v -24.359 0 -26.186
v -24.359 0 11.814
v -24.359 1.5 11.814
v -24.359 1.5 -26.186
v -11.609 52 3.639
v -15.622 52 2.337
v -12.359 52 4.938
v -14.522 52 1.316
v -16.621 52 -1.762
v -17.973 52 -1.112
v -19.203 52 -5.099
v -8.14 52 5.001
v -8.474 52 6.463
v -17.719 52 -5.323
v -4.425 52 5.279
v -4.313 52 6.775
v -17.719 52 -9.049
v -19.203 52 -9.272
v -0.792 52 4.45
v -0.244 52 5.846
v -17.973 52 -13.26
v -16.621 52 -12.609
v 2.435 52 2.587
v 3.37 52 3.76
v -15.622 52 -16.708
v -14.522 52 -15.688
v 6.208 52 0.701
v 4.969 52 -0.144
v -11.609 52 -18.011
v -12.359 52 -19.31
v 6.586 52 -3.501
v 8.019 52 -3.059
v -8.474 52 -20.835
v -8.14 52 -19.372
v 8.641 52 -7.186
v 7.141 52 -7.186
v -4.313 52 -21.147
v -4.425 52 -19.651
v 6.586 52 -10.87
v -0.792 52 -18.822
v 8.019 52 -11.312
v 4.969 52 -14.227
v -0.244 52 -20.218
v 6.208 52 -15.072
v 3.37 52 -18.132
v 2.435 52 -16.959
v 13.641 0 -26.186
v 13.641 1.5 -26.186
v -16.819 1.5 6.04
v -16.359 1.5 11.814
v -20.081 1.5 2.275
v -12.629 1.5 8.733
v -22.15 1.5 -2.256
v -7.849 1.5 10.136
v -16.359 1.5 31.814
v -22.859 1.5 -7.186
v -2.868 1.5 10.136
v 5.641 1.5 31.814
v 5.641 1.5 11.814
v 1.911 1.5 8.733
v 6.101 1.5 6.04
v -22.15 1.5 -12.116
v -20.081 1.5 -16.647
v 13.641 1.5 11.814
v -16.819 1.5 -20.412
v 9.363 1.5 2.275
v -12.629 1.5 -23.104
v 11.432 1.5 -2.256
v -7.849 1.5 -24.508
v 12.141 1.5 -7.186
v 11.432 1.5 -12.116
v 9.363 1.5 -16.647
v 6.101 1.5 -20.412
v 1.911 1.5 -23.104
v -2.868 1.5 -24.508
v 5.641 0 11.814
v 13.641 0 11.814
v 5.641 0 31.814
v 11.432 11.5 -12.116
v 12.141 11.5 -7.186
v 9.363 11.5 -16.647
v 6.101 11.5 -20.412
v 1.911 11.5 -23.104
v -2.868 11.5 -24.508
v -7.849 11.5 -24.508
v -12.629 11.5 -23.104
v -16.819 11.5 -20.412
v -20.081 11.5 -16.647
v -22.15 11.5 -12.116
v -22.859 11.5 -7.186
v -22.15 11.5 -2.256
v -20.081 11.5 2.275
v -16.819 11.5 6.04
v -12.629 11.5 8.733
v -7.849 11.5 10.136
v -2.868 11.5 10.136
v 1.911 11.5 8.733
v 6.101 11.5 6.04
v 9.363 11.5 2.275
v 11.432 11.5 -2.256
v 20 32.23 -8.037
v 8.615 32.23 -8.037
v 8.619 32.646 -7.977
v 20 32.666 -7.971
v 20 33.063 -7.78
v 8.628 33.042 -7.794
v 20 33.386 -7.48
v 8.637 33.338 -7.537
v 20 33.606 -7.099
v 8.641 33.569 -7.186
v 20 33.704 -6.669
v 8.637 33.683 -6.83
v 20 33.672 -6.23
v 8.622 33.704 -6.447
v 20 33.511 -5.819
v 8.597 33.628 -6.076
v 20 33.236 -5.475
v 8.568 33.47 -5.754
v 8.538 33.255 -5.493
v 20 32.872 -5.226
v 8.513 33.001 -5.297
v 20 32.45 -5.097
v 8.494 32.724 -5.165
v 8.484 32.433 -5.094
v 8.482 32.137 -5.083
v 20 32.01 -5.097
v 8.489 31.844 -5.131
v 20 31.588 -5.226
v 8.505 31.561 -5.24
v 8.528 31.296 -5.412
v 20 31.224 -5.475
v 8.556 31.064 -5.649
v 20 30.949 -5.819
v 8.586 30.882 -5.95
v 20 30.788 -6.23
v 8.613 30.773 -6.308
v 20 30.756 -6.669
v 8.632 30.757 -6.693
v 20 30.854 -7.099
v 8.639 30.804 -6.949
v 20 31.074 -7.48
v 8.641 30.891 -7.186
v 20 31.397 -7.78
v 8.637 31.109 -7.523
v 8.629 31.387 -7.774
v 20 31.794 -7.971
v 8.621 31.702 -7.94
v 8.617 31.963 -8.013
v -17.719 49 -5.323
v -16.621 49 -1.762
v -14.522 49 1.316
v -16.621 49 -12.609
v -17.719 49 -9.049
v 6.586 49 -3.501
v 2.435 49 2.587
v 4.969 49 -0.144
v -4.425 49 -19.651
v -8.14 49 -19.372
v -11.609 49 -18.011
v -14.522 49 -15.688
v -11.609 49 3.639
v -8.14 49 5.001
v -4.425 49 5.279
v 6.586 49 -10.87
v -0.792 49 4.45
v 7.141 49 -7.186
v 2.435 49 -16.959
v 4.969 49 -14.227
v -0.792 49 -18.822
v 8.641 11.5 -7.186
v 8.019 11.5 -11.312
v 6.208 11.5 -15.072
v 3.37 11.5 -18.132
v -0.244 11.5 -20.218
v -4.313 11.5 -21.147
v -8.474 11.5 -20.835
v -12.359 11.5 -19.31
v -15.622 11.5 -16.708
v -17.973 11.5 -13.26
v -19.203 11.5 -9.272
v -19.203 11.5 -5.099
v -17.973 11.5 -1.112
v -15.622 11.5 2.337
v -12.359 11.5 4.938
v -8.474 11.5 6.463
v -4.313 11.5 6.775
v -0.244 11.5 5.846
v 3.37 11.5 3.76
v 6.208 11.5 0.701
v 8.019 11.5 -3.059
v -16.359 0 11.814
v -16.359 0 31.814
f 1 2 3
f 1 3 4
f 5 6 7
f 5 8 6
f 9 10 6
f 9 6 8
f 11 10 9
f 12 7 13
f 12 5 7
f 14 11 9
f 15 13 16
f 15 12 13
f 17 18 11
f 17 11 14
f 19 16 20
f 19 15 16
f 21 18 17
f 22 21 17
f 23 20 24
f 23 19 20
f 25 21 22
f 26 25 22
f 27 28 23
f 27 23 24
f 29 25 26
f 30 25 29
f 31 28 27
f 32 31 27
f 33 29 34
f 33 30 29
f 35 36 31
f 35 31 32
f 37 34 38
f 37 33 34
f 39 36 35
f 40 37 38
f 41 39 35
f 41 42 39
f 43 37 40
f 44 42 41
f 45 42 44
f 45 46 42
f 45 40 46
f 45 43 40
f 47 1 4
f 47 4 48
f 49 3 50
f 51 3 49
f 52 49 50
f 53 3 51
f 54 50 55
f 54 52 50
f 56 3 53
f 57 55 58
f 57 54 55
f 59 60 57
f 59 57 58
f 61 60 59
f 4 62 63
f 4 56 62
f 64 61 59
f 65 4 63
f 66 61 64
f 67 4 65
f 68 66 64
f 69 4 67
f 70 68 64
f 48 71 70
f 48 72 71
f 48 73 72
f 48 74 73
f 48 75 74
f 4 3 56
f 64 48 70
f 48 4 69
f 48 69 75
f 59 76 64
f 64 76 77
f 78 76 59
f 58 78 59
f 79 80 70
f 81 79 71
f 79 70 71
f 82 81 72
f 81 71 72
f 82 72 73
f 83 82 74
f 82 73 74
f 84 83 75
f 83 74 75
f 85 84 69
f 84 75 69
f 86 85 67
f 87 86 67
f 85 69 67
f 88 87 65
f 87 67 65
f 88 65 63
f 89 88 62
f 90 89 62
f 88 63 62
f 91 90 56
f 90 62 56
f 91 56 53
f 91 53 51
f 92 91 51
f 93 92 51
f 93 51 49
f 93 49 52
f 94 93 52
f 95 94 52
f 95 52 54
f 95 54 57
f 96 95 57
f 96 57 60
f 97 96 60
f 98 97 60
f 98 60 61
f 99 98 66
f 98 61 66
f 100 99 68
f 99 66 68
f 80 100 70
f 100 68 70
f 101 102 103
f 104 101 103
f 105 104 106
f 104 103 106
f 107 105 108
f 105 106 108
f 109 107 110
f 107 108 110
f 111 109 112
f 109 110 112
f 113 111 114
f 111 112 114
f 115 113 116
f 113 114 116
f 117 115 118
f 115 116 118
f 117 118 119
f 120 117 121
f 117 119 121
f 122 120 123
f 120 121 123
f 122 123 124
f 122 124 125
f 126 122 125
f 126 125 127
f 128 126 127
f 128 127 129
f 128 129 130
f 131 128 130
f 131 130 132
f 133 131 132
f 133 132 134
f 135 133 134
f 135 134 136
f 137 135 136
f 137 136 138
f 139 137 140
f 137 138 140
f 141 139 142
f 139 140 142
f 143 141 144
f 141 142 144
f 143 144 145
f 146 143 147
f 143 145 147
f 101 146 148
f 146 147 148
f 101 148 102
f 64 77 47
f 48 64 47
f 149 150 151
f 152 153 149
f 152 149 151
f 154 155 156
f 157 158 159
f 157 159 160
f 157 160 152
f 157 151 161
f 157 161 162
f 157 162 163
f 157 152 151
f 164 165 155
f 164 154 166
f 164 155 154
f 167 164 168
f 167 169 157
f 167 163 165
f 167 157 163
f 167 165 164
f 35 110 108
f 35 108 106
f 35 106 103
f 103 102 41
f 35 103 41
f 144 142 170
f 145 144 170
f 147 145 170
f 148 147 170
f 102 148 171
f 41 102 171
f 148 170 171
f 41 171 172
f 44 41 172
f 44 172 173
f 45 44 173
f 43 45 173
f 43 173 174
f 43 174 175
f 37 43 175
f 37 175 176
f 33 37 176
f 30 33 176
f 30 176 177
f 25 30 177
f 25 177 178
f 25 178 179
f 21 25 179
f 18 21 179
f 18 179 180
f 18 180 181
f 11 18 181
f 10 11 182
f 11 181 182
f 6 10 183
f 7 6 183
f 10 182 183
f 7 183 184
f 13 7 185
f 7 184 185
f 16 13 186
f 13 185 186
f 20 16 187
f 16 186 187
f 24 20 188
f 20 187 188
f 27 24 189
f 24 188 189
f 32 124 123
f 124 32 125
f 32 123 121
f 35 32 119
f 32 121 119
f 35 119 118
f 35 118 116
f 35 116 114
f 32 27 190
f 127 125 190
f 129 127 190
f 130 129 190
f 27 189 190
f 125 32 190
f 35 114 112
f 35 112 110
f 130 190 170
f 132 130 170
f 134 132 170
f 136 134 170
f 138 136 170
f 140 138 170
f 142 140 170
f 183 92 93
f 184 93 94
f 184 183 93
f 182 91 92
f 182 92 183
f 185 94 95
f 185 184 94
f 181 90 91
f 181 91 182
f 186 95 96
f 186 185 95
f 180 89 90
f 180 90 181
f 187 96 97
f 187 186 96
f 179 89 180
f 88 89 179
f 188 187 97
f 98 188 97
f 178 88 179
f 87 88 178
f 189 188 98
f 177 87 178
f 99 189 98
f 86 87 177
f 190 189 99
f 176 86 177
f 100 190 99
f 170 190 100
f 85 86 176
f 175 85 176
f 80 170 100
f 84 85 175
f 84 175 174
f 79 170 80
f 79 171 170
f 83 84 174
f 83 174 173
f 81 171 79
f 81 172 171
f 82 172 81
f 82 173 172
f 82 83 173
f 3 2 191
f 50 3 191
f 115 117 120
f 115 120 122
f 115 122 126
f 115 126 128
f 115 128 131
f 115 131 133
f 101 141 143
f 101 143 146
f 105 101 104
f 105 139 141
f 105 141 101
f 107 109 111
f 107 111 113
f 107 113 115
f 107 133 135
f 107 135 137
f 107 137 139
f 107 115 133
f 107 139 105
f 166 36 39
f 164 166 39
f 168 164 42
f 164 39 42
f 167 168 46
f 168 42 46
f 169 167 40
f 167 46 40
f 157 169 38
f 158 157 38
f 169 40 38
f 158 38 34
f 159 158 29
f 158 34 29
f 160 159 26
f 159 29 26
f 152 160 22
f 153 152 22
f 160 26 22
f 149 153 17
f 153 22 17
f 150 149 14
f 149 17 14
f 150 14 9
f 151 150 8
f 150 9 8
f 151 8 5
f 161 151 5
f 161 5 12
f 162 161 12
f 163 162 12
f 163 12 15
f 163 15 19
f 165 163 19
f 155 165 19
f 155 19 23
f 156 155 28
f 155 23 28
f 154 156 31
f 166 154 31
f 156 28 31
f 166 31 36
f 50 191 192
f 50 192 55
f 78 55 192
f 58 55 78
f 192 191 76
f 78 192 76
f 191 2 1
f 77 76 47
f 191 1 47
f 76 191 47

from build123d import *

# Parameters (mm, degrees)
SKETCH1_W           = 38
SKETCH1_H           = 38
BOSS_EXTRUDE1_DEPTH = 1.5
SKETCH2_R           = 17.5
BOSS_EXTRUDE2_DEPTH = 10
SKETCH3_R           = 14
BOSS_EXTRUDE3_DEPTH = 40.5
SKETCH4_R           = 12.5
CUT_EXTRUDE1_DEPTH  = 3
SKETCH5_R           = 1.478595514
BOSS_EXTRUDE4_DEPTH = 20
SKETCH6_W           = 22
SKETCH6_H           = 1.5
BOSS_EXTRUDE5_DEPTH = 20


with BuildPart() as part:
    # Sketch1 → Boss-Extrude1 (new body)
    with BuildSketch(Plane(origin=(0, 0, 0), x_dir=(1, 0, 0), z_dir=(0, 1, 0))):
        with Locations((-5.358974359, 7.185897436)):
            Rectangle(SKETCH1_W, SKETCH1_H)
    extrude(amount=BOSS_EXTRUDE1_DEPTH)

    # Sketch2 → Boss-Extrude2 (add)
    with BuildSketch(Plane(origin=(0, 1.5, 0), x_dir=(1, 0, 0), z_dir=(0, 1, 0))):
        with Locations((-5.358974359, 7.185897436)):
            Circle(SKETCH2_R)
    extrude(amount=BOSS_EXTRUDE2_DEPTH)

    # Sketch3 → Boss-Extrude3 (add)
    with BuildSketch(Plane(origin=(0, 11.5, 0), x_dir=(1, 0, 0), z_dir=(0, 1, 0))):
        with Locations((-5.358974359, 7.185897436)):
            Circle(SKETCH3_R)
    extrude(amount=BOSS_EXTRUDE3_DEPTH)

    # Sketch4 → Cut-Extrude1 (cut)
    with BuildSketch(Plane(origin=(0, 52, 0), x_dir=(1, 0, 0), z_dir=(0, 1, 0))):
        with Locations((-5.358974359, 7.185897436)):
            Circle(SKETCH4_R)
    extrude(amount=-CUT_EXTRUDE1_DEPTH, mode=Mode.SUBTRACT)

    # Sketch5 → Boss-Extrude4 (add)
    with BuildSketch(Plane(origin=(0, 0, 0), x_dir=(0, 0, -1), z_dir=(1, 0, 0))):
        with Locations((6.558582487, 32.23)):
            Circle(SKETCH5_R)
    extrude(amount=BOSS_EXTRUDE4_DEPTH)

    # Sketch6 → Boss-Extrude5 (add)
    with BuildSketch(Plane.XY.offset(11.814102564)):
        with Locations((-5.358974359, 0.75)):
            Rectangle(SKETCH6_W, SKETCH6_H)
    extrude(amount=BOSS_EXTRUDE5_DEPTH)


solid = part.part
